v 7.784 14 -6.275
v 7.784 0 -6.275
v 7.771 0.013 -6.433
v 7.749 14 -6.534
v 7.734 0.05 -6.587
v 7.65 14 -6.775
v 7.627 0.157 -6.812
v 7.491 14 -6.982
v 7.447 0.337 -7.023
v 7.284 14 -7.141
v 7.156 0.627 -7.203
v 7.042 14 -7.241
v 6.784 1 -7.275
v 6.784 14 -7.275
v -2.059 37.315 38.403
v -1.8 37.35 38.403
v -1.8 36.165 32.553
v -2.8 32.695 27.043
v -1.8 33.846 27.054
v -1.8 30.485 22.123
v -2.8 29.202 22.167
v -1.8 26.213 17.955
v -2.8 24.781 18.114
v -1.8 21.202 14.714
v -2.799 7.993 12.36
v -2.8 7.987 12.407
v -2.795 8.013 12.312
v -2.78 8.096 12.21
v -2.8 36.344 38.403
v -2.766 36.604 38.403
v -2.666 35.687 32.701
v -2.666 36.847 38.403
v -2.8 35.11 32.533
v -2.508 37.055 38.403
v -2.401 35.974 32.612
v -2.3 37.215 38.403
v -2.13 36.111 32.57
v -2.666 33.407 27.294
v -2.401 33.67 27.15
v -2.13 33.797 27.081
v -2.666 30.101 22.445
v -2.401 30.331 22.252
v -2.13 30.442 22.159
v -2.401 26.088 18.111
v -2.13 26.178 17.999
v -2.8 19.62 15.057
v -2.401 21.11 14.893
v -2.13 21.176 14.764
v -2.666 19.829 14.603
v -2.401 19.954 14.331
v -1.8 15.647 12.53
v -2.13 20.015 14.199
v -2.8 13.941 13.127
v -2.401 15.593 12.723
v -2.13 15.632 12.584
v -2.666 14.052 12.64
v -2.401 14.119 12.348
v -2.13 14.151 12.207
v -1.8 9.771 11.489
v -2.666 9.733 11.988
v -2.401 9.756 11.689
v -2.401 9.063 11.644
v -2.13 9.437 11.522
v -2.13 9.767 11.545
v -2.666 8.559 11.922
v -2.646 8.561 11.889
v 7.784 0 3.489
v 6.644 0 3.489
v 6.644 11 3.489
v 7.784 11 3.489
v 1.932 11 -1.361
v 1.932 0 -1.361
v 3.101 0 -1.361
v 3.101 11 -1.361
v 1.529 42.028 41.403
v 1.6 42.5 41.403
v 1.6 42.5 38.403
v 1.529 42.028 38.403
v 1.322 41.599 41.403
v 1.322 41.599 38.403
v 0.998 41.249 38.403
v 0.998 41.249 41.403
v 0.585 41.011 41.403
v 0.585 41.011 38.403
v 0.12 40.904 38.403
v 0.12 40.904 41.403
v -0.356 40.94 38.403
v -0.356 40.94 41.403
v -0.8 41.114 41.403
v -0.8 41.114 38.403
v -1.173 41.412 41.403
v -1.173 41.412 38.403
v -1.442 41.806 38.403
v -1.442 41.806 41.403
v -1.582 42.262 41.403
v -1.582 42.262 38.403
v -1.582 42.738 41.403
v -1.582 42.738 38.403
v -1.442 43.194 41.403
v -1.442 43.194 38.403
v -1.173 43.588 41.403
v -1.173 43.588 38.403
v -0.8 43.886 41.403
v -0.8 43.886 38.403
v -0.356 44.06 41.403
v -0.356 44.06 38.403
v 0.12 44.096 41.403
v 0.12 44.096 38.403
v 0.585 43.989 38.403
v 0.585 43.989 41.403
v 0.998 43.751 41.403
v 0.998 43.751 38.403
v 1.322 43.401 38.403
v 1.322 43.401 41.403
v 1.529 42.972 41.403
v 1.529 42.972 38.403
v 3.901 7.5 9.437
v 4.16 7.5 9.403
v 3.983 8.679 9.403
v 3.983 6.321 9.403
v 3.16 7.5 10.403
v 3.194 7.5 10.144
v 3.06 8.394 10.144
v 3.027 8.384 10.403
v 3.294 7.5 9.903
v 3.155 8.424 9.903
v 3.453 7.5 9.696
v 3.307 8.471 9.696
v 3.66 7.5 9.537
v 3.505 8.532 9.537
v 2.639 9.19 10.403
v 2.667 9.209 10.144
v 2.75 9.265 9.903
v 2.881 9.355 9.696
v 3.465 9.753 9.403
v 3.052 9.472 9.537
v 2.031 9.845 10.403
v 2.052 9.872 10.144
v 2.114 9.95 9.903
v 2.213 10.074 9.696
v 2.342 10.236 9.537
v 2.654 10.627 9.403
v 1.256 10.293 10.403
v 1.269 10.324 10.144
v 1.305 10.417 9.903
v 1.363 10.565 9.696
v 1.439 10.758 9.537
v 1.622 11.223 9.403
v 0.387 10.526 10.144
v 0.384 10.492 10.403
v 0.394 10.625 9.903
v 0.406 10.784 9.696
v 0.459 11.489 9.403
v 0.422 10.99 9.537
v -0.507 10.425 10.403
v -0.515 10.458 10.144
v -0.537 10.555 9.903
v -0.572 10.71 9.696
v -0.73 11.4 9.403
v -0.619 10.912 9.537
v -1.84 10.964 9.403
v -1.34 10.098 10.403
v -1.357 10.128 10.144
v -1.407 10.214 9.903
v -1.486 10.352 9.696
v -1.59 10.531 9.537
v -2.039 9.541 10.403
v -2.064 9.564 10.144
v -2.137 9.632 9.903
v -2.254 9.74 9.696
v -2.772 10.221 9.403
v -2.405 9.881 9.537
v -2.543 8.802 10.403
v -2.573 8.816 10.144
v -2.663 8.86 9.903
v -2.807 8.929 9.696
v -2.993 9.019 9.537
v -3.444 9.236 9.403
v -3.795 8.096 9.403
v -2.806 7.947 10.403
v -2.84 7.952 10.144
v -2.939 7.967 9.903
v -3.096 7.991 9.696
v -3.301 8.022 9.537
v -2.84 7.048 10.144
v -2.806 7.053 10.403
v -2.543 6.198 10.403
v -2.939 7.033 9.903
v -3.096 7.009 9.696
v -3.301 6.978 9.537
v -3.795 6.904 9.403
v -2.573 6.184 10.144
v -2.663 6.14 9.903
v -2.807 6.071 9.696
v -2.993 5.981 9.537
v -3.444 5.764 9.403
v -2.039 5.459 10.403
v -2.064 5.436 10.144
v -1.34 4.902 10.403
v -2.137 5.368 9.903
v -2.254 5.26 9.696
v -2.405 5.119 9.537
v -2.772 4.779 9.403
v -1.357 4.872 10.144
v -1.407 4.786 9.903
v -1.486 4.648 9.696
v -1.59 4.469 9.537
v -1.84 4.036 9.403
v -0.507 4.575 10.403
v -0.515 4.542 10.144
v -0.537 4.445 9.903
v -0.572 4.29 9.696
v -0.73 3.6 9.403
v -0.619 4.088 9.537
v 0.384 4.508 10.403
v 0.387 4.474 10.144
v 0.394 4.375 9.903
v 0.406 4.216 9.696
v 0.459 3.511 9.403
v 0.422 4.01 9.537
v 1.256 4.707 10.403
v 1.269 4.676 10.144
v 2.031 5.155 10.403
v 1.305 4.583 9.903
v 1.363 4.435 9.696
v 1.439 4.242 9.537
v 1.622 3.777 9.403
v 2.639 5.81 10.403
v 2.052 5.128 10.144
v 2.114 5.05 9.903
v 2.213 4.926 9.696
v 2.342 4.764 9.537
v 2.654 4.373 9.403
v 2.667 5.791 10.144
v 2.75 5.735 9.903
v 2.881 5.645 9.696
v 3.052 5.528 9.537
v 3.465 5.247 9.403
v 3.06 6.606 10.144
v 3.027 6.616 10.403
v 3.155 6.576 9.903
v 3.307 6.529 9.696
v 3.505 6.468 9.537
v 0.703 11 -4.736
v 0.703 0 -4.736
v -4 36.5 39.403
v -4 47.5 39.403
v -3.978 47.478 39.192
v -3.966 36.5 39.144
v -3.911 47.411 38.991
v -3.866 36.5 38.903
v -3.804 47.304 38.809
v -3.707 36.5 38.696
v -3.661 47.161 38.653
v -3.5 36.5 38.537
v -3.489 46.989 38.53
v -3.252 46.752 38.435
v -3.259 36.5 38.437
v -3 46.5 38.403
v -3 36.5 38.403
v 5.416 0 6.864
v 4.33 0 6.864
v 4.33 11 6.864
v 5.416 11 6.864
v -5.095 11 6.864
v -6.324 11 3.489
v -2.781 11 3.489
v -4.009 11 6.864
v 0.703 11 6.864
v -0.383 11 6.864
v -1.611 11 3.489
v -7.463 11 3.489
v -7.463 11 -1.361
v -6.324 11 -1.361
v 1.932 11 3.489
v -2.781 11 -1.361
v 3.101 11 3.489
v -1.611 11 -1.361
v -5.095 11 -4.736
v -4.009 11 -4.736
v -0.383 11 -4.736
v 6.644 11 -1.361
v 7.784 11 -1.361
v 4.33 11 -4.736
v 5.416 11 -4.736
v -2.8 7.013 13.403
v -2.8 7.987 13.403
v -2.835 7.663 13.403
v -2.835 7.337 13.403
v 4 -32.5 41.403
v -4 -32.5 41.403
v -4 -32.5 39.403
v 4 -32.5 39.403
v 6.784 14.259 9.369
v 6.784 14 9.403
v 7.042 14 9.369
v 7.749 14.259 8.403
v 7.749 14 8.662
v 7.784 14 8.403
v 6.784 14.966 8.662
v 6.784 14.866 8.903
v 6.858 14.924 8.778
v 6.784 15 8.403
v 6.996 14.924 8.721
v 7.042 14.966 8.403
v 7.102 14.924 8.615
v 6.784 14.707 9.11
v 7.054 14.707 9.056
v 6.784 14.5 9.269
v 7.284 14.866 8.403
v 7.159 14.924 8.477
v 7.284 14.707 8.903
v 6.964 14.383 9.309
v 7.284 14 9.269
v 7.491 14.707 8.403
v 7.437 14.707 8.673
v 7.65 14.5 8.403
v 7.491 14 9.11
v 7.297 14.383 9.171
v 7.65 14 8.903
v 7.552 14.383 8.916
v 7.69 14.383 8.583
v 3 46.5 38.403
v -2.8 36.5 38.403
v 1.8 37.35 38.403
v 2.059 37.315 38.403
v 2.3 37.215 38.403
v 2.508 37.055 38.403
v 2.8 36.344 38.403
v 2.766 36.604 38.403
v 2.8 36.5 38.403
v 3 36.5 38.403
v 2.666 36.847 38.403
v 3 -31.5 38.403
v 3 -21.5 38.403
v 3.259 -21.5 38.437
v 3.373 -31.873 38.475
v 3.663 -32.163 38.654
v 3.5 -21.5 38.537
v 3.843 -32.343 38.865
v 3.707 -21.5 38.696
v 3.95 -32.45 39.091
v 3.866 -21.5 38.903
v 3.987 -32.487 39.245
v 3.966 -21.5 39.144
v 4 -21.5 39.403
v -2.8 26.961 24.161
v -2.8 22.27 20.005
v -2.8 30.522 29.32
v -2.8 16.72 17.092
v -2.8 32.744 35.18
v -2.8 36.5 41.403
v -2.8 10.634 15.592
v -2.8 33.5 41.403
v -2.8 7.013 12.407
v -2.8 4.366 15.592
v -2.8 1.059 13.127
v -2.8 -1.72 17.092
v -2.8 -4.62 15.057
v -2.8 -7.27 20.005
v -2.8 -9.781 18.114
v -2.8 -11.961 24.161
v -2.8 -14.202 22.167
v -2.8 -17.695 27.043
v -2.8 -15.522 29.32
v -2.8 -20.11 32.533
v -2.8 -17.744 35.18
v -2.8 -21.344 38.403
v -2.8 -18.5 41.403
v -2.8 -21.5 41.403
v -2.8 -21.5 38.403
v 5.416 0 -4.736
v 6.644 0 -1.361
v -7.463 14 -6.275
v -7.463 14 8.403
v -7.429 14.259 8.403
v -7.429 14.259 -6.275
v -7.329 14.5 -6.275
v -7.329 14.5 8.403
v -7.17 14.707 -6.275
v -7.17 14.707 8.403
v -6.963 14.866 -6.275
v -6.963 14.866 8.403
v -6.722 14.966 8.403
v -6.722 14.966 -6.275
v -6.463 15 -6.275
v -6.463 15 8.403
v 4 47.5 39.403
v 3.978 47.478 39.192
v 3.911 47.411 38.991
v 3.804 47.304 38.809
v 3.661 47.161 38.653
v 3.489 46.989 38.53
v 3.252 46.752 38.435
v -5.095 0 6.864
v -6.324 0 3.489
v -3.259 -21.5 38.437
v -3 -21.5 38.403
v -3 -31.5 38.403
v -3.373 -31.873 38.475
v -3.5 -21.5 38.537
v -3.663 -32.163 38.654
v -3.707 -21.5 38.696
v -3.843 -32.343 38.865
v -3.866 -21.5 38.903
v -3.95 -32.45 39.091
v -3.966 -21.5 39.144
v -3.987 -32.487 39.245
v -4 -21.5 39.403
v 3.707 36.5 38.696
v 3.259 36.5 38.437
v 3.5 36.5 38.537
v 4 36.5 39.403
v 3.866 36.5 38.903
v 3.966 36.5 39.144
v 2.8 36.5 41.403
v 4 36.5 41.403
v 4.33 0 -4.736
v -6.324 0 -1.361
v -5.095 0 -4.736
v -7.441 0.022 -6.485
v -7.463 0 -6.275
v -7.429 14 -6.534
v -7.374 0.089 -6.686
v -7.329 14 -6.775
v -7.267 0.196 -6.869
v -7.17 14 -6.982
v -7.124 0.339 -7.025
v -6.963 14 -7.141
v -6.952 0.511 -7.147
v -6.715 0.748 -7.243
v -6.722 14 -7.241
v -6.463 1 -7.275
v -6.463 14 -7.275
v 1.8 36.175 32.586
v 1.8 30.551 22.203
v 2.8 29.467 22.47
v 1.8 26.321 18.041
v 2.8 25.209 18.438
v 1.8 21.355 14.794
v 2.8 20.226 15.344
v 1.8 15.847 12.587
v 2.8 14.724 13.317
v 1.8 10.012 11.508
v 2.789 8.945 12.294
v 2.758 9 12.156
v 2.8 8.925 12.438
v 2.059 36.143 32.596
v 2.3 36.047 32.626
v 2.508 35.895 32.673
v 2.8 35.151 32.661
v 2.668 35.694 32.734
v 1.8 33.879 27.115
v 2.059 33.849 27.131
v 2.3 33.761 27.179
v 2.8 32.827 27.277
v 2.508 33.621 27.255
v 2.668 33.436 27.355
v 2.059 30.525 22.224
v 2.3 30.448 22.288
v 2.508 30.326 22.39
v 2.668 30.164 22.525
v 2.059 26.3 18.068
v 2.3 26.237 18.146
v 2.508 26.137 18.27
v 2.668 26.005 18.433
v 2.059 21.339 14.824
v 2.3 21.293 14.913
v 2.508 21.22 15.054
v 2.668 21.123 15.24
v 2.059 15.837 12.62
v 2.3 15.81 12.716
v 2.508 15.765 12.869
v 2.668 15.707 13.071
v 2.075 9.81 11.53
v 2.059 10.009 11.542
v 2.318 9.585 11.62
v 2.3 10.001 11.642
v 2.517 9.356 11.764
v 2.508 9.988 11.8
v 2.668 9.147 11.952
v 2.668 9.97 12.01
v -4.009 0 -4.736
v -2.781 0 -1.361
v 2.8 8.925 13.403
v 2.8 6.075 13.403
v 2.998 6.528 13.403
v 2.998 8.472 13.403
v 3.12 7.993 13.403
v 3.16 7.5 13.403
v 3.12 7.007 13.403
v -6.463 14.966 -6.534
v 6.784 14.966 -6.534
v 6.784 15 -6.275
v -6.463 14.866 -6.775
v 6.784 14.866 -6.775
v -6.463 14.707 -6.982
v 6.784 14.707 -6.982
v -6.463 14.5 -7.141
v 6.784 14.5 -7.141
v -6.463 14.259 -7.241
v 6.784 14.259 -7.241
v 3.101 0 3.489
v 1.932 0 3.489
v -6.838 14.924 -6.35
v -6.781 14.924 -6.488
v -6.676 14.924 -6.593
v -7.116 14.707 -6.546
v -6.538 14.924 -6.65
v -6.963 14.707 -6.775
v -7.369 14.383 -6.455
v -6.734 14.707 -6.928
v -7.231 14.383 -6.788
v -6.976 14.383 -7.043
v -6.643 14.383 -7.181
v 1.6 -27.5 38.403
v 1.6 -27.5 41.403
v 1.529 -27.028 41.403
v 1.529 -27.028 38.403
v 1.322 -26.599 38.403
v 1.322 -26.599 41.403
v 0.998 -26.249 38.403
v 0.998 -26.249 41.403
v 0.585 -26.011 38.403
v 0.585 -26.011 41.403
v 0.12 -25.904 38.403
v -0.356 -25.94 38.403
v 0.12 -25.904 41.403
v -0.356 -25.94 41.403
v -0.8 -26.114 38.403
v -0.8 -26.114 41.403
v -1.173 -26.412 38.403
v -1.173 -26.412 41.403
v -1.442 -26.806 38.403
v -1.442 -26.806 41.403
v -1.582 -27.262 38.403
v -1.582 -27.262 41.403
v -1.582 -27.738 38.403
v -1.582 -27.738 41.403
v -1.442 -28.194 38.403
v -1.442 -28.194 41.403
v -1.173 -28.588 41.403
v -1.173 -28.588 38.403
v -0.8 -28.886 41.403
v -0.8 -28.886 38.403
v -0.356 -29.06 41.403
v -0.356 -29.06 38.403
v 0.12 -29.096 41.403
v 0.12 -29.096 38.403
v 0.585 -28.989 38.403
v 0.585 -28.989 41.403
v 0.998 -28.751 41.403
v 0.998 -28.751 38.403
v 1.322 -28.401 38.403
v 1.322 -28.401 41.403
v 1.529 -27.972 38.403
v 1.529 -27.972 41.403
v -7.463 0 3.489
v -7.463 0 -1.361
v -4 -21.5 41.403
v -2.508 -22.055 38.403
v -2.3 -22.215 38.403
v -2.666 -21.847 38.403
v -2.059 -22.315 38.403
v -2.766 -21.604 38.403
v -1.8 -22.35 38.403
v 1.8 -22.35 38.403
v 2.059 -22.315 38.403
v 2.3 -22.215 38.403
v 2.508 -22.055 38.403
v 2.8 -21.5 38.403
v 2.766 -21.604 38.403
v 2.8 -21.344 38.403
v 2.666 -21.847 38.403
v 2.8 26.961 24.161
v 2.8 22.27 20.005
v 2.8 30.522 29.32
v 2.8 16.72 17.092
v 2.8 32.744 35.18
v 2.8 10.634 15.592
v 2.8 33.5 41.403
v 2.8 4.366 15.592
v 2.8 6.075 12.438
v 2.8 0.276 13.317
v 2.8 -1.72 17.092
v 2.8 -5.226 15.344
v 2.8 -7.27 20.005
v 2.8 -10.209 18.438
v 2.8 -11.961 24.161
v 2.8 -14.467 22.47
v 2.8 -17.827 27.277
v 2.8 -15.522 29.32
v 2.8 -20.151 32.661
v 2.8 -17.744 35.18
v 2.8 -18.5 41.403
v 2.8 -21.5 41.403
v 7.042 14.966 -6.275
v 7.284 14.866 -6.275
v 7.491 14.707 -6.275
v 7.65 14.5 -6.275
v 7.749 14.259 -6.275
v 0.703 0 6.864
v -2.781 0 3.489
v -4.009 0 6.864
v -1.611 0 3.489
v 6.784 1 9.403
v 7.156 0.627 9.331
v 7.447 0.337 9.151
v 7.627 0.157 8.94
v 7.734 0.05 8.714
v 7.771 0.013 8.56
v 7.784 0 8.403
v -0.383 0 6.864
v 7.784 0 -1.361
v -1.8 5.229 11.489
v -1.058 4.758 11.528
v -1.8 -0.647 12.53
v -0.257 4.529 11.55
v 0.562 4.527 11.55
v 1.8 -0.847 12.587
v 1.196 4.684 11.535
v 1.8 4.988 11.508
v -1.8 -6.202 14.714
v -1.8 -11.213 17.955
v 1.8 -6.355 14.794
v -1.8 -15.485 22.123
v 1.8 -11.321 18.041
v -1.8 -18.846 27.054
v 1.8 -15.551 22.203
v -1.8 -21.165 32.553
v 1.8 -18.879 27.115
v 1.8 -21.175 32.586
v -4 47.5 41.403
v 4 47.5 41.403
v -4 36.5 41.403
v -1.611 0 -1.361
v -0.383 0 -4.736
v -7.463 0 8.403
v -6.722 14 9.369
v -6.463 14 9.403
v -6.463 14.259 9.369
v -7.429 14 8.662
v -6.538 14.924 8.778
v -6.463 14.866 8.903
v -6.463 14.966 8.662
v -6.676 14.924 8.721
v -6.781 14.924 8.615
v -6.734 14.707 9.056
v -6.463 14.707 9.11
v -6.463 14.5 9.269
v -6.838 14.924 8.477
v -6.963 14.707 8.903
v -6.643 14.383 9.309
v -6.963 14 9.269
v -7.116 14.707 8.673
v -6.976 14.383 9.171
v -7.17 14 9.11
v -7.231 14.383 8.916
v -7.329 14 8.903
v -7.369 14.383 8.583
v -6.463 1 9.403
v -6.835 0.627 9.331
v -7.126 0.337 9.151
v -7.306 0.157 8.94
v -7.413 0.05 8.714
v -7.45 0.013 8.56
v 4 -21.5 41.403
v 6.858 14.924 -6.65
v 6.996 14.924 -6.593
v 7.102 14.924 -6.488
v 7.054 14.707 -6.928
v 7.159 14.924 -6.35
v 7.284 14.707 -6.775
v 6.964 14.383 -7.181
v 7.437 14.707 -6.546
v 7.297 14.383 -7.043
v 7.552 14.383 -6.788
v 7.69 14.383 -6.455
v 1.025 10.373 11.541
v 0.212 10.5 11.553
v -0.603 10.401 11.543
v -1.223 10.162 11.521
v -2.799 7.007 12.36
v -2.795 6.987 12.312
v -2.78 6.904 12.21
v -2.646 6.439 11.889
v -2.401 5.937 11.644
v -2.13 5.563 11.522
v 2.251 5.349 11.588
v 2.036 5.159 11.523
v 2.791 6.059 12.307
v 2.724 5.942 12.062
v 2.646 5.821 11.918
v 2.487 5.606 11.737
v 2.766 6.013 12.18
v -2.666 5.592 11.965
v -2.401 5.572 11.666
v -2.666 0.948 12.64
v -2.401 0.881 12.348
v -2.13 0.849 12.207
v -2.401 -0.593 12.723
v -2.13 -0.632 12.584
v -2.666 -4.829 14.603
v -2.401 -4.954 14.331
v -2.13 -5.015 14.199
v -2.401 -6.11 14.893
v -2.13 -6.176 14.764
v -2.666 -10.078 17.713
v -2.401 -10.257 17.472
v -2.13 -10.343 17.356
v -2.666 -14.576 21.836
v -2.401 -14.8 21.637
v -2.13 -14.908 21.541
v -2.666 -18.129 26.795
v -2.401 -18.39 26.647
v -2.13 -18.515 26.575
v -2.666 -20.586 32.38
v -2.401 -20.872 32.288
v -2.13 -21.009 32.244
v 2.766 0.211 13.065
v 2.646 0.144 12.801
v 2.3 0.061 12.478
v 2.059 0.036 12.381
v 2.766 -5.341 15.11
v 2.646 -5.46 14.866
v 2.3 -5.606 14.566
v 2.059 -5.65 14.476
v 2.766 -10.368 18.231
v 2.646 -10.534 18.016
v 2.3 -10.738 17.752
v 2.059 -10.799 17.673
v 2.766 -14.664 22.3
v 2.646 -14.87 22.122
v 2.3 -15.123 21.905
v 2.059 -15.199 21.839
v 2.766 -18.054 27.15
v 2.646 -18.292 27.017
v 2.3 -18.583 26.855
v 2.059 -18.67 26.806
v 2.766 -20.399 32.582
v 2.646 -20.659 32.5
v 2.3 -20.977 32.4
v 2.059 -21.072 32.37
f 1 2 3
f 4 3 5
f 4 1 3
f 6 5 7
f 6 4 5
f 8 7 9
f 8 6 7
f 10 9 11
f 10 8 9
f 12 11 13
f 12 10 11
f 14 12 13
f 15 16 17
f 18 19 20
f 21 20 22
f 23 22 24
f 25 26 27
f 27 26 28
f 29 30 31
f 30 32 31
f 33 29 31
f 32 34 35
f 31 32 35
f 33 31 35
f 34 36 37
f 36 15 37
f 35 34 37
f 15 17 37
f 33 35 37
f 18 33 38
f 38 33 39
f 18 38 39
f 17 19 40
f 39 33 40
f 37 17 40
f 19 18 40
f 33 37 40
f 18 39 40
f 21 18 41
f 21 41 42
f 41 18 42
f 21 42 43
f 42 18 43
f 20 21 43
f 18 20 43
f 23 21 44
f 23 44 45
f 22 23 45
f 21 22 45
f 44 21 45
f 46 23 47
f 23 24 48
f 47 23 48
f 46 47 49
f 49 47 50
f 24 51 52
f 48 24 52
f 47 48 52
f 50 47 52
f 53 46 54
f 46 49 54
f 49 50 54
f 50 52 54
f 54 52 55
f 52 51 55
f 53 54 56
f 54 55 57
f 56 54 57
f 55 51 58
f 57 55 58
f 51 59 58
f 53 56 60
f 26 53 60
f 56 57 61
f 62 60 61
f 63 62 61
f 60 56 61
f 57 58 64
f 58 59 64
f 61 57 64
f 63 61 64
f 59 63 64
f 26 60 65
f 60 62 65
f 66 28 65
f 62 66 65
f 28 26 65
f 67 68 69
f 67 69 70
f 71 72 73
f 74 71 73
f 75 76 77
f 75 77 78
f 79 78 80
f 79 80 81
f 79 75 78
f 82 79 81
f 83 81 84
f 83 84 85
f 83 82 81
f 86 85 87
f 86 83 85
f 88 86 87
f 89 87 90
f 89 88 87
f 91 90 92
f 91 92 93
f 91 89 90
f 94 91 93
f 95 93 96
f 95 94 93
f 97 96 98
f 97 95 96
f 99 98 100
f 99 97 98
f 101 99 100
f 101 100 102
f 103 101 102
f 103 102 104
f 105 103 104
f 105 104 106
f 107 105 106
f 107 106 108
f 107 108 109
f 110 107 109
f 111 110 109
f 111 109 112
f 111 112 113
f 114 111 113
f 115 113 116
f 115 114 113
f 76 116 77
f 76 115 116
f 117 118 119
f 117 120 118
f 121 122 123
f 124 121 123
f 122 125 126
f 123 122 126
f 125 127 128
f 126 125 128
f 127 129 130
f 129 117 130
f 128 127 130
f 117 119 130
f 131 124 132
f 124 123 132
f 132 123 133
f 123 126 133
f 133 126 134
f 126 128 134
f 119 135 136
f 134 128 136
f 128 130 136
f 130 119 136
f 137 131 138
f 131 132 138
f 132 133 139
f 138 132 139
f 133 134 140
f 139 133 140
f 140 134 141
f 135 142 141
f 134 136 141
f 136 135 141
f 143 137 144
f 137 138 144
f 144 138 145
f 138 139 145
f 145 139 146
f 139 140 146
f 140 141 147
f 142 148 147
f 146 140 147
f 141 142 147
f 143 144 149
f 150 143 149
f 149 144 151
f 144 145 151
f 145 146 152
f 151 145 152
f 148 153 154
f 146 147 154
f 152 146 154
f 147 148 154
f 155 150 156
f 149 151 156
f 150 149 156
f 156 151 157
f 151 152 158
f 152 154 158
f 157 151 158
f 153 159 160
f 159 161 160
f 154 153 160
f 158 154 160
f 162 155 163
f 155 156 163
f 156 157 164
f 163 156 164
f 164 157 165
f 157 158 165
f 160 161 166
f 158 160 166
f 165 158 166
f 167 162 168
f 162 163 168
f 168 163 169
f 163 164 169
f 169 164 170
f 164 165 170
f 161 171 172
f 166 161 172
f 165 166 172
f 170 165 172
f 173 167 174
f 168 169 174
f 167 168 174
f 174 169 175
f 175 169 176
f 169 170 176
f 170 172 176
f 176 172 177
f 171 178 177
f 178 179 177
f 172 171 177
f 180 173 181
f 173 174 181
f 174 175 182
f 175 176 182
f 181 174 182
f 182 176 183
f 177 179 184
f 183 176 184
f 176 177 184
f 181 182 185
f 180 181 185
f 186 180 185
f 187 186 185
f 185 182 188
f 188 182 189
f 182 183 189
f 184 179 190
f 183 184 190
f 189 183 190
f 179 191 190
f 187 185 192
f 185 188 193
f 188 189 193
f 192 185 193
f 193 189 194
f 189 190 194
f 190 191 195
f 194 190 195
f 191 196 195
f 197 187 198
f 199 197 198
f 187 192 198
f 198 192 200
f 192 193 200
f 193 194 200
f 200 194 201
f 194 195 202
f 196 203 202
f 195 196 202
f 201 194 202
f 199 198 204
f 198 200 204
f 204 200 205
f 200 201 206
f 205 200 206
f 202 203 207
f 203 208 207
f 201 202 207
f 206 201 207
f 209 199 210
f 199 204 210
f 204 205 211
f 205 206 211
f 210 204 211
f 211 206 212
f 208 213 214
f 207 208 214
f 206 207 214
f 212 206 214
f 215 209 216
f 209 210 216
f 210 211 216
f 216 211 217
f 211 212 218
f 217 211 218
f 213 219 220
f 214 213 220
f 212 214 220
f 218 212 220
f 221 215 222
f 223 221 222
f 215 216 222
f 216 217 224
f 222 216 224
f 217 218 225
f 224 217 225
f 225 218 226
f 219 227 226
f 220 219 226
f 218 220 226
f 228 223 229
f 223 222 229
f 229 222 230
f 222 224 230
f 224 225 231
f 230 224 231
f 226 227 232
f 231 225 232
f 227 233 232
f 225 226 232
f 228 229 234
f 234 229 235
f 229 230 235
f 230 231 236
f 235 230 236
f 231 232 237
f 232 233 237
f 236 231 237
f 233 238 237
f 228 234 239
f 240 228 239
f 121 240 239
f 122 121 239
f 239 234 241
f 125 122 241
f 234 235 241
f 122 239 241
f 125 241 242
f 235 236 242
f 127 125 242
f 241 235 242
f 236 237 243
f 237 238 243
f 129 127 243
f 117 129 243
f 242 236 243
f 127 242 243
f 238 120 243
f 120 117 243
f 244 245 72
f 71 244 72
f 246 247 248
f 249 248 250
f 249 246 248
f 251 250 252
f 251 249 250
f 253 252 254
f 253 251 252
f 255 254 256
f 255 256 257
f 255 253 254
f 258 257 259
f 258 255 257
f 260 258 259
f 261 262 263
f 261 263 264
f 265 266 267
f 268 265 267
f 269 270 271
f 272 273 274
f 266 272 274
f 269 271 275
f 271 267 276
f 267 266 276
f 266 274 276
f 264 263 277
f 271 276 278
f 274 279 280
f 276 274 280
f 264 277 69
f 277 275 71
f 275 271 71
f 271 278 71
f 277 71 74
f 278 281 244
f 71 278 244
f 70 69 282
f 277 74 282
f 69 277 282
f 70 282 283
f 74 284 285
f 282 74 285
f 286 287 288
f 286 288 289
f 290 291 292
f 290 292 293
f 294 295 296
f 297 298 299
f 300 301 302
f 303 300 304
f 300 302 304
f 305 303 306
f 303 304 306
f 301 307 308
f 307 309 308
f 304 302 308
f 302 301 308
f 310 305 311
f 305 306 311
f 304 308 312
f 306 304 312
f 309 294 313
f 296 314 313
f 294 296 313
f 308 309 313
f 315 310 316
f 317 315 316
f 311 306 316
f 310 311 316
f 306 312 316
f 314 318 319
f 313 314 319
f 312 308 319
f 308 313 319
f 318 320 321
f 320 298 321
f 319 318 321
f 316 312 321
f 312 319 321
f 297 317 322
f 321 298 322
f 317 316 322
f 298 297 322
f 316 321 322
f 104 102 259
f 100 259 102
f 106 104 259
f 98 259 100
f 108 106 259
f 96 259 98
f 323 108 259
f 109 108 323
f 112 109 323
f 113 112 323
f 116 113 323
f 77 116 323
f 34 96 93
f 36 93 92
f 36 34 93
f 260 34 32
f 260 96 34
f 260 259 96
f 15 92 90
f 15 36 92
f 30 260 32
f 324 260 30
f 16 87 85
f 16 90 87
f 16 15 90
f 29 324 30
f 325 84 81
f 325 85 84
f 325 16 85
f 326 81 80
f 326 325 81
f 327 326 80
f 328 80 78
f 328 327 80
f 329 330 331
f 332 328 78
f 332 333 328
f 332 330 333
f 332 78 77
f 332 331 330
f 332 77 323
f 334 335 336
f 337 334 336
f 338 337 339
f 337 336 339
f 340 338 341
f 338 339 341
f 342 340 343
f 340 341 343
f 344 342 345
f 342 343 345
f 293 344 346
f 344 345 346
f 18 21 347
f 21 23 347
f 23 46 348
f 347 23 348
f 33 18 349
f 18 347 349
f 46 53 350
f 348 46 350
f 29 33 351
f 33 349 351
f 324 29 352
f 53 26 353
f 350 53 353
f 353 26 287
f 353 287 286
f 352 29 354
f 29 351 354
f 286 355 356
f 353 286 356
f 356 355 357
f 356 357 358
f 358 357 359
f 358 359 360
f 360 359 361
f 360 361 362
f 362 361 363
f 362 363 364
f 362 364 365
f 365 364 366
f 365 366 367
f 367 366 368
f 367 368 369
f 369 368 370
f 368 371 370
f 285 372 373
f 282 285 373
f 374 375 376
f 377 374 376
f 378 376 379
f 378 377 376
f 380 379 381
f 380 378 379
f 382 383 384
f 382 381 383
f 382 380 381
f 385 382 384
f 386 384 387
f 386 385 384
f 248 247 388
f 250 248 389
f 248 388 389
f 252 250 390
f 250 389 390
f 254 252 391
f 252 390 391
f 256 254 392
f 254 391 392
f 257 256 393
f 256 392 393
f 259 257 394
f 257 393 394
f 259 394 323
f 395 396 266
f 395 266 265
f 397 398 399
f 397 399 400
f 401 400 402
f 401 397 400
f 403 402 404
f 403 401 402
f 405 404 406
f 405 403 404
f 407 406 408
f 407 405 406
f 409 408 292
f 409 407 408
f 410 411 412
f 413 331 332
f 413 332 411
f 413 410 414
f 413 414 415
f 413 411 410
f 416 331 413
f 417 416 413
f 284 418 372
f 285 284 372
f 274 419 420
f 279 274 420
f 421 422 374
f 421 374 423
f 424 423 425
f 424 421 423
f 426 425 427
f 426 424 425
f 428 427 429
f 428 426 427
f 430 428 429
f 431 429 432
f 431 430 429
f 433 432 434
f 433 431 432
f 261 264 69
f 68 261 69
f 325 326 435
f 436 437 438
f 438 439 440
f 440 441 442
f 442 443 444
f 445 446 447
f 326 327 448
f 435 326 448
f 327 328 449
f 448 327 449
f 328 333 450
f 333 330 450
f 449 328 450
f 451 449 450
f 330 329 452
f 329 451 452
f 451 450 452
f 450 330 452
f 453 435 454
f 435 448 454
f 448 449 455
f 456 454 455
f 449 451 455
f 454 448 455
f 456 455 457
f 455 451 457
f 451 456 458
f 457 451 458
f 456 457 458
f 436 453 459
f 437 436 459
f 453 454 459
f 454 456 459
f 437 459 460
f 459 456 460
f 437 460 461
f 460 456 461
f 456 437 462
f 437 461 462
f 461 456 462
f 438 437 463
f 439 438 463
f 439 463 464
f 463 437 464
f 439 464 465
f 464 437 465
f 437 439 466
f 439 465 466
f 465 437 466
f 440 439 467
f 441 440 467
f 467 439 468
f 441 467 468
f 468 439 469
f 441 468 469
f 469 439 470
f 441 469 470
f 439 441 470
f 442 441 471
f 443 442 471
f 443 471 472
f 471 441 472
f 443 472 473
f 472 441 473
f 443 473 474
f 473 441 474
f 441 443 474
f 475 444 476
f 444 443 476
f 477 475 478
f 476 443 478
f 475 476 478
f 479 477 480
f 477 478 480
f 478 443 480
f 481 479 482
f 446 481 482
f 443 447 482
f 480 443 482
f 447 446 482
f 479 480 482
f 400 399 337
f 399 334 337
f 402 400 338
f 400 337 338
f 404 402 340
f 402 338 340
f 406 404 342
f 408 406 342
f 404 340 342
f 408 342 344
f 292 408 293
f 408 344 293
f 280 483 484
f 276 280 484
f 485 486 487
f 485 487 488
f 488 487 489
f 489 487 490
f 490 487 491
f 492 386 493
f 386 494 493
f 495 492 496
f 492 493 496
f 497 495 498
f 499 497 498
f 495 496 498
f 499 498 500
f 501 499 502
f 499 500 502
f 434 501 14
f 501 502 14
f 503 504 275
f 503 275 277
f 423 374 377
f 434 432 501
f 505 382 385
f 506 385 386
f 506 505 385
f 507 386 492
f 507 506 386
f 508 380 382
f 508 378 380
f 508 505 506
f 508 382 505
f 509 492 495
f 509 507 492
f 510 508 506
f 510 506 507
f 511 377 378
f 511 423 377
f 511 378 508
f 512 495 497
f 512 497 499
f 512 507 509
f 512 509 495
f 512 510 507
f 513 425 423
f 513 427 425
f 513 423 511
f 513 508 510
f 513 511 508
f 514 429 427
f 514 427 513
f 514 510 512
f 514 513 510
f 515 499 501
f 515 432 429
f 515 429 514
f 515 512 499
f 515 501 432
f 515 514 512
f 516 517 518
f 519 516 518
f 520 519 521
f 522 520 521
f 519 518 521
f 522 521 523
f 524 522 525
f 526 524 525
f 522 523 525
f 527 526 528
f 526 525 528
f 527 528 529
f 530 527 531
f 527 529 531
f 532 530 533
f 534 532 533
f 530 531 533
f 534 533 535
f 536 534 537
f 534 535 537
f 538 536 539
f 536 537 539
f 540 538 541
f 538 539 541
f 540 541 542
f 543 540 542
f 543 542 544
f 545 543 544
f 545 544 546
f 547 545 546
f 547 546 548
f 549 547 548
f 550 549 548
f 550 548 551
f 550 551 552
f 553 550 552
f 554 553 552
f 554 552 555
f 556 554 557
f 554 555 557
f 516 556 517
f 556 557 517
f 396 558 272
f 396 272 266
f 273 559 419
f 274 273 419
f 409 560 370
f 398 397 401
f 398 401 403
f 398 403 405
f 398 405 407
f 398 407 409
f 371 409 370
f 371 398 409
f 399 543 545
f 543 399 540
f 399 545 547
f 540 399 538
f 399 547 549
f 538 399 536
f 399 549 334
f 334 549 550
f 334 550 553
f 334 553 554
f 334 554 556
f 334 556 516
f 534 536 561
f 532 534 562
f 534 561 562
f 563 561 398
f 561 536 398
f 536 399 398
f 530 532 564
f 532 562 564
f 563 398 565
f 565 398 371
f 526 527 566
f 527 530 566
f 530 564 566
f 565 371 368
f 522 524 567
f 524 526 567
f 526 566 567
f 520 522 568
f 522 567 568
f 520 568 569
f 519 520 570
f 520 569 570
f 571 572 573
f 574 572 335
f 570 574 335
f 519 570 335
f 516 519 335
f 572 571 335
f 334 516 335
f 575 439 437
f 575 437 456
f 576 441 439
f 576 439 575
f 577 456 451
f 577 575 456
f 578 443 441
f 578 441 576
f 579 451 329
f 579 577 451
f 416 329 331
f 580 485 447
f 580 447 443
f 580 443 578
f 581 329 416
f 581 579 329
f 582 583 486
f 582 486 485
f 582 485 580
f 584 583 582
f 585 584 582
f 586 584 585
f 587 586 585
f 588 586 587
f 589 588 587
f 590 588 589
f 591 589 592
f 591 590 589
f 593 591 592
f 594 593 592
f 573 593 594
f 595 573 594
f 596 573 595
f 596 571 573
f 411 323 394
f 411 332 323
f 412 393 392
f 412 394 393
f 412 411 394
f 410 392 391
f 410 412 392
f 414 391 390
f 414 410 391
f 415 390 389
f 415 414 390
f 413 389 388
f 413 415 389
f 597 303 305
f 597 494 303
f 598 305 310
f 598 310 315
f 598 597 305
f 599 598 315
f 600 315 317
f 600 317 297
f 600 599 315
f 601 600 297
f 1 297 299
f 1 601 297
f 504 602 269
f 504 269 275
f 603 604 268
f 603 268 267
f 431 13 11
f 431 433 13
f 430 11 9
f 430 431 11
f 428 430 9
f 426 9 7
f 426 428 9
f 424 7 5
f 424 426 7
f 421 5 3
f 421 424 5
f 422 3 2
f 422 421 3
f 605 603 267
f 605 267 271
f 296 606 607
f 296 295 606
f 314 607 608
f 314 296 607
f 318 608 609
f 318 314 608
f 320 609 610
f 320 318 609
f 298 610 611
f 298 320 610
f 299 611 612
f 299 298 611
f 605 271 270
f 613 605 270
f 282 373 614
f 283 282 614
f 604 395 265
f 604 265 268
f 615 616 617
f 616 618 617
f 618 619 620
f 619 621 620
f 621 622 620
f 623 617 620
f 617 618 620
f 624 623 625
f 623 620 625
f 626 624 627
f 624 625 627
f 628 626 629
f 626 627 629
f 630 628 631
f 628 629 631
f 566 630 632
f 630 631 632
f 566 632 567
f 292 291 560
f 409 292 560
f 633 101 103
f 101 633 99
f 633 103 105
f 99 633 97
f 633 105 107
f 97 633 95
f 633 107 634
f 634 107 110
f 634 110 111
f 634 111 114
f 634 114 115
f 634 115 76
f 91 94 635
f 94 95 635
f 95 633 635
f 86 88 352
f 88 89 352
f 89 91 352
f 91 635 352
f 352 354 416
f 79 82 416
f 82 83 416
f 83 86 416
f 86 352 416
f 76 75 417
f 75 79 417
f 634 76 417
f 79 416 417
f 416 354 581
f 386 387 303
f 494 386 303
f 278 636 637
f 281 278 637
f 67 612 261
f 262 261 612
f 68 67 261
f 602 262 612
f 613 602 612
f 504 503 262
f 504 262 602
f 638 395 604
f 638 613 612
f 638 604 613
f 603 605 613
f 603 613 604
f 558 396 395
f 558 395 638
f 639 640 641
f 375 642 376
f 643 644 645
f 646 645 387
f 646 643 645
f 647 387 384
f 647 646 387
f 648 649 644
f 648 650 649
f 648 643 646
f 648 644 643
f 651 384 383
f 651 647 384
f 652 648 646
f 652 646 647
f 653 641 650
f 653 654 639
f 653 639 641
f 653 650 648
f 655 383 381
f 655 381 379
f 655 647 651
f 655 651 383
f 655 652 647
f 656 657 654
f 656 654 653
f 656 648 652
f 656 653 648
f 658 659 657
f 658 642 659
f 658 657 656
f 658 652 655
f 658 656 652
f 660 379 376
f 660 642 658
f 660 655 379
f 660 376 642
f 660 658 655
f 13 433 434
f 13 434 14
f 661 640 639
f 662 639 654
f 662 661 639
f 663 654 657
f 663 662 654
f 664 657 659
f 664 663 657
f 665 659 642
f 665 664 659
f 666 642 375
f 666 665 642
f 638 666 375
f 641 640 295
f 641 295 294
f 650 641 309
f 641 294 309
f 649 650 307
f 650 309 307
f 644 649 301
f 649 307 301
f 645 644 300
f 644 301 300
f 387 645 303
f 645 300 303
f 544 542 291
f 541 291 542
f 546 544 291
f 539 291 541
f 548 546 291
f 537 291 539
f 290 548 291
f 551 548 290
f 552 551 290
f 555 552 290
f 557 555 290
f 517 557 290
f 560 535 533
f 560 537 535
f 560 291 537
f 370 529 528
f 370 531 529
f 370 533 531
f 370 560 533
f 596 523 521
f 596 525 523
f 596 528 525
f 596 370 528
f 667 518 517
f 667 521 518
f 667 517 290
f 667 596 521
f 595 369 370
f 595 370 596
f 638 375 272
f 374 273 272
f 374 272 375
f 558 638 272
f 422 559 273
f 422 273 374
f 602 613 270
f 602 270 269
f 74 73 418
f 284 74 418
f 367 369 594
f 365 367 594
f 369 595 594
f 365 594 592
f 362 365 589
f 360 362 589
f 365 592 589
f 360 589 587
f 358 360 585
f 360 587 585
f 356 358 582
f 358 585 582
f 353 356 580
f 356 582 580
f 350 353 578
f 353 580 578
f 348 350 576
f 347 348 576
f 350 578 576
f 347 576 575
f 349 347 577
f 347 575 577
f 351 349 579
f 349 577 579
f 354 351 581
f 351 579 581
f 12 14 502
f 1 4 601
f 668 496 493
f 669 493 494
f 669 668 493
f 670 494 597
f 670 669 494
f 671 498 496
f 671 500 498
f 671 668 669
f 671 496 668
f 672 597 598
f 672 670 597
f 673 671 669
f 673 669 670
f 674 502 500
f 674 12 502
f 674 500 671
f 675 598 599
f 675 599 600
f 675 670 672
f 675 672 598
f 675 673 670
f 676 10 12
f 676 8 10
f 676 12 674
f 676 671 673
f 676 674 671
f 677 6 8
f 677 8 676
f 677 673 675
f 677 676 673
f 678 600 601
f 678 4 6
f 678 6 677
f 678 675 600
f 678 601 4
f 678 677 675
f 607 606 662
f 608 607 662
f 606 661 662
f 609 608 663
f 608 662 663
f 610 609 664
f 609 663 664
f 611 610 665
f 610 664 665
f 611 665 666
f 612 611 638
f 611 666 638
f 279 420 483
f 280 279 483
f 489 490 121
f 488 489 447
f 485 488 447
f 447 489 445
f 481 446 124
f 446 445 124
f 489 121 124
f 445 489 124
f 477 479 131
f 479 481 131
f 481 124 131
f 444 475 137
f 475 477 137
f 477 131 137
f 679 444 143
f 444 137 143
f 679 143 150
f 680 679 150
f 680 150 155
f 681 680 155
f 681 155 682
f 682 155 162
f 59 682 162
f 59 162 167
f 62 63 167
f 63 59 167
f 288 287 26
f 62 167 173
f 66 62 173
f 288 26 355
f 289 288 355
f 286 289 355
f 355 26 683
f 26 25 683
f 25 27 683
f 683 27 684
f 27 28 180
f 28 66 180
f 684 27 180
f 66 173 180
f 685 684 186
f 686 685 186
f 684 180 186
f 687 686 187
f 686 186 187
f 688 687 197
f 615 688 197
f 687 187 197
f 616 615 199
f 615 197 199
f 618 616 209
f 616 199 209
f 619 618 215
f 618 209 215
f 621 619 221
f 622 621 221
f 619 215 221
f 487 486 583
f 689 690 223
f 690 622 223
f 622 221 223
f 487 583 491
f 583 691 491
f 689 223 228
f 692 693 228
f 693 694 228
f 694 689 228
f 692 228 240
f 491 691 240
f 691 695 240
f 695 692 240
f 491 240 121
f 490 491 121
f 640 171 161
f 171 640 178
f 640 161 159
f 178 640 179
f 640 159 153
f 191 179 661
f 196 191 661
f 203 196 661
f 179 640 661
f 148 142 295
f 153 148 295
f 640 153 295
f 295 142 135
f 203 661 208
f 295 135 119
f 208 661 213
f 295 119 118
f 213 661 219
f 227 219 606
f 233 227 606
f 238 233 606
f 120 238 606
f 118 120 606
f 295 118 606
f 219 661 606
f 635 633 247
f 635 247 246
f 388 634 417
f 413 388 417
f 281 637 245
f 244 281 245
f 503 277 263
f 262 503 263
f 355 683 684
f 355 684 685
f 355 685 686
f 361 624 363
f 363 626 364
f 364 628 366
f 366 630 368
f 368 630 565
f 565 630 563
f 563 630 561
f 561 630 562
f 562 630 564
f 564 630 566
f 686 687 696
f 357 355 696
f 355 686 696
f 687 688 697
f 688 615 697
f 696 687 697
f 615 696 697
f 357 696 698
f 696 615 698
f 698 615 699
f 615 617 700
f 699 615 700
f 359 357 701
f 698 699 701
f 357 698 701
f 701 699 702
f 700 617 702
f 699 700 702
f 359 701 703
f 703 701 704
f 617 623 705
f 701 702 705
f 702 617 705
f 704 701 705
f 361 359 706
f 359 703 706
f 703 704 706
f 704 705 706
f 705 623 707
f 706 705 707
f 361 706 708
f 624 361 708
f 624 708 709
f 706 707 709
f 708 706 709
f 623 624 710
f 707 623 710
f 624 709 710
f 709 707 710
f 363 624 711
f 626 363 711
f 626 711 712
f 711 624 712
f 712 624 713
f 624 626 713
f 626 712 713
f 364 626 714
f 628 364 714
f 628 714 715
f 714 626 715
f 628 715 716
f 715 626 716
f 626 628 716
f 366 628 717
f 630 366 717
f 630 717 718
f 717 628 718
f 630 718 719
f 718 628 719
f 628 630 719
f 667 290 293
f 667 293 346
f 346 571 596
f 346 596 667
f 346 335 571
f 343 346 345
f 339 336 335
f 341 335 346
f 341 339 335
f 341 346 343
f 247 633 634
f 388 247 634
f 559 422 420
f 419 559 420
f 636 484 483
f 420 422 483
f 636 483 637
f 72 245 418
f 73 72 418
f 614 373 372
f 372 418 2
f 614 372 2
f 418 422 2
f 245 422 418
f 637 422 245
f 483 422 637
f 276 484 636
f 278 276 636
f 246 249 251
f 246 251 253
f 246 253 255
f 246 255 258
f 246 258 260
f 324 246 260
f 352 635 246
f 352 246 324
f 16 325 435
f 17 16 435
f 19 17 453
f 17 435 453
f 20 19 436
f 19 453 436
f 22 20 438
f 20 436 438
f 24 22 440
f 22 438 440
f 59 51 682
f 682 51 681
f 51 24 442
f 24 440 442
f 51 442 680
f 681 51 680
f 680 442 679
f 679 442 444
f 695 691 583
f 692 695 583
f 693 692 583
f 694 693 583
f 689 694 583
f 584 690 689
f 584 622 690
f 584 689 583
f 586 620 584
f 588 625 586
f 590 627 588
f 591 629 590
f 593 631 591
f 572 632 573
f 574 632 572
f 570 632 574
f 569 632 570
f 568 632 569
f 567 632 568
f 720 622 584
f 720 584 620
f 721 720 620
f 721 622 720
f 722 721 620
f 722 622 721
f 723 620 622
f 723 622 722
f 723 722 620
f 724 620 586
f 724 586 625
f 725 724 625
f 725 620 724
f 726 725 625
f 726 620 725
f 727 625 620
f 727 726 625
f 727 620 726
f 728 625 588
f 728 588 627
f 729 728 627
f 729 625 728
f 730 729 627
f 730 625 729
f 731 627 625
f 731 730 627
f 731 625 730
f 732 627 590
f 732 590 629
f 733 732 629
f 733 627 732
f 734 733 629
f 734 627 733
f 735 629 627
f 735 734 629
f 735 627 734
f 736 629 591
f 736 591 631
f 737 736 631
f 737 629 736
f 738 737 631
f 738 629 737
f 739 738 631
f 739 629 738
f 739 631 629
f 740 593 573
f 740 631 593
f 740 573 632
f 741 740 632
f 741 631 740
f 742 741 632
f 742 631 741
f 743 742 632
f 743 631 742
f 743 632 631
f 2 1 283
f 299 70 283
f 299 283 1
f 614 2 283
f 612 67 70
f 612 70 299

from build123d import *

# Parameters (mm, degrees)
BOSS_EXTRUDE1_DEPTH   = 11
BOSS_EXTRUDE1_2_DEPTH = 11
SKETCH2_W             = 15.446473034
SKETCH2_H             = 16.677637278
BOSS_EXTRUDE2_DEPTH   = 4
SKETCH3_R             = 3
BOSS_EXTRUDE3_DEPTH   = 4
BOSS_EXTRUDE4_DEPTH   = 2.8
CUT_EXTRUDE1_DEPTH    = 11
SKETCH11_W            = 0.1
SKETCH11_H            = 16.677637278
CUT_EXTRUDE2_DEPTH    = 11
SKETCH12_W            = 8
SKETCH12_H            = 14
SKETCH12_R            = 1.6
BOSS_EXTRUDE5_DEPTH   = 3
FILLET1_R             = 1
SKETCH14_W            = 1.465452289
SKETCH14_H            = 3.319739537
SKETCH14_W_2          = 1.579669893
CUT_EXTRUDE3_DEPTH    = 3
SKETCH15_W            = 1.507141025
SKETCH15_H            = 3.716681852
SKETCH15_W_2          = 1.554838049
SKETCH15_H_2          = 3.443775751
CUT_EXTRUDE4_DEPTH    = 3


with BuildPart() as part:
    # Sketch1 → Boss-Extrude1 (new body)
    with BuildSketch(Plane(origin=(0, 0, 0), x_dir=(1, 0, 0), z_dir=(0, 1, 0))):
        Polygon((6.574205289, -3.388868816), (7.883511398, -3.388868816), (7.883511398, -9.402687455), (-7.562961636, -9.402687455), (-7.562961636, -3.388868816), (-6.253655527, -3.388868816), (-5.025255986, -6.763868816), (-4.078972201, -6.763868816), (-2.850572661, -3.388868816), (-1.541266552, -3.388868816), (-0.312867011, -6.763868816), (0.633416774, -6.763868816), (1.861816314, -3.388868816), (3.171122423, -3.388868816), (4.399521964, -6.763868816), (5.345805749, -6.763868816), align=None)
    extrude(amount=BOSS_EXTRUDE1_DEPTH)



with BuildPart() as body_2:
    # Sketch1 → Boss-Extrude1 2 (new body)
    with BuildSketch(Plane(origin=(0, 0, 0), x_dir=(1, 0, 0), z_dir=(0, 1, 0))):
        Polygon((6.574205289, 1.261131184), (7.883511398, 1.261131184), (7.883511398, 7.274949823), (-7.562961636, 7.274949823), (-7.562961636, 1.261131184), (-6.253655527, 1.261131184), (-5.025255986, 4.636131184), (-4.078972201, 4.636131184), (-2.850572661, 1.261131184), (-1.541266552, 1.261131184), (-0.312867011, 4.636131184), (0.633416774, 4.636131184), (1.861816314, 1.261131184), (3.171122423, 1.261131184), (4.399521964, 4.636131184), (5.345805749, 4.636131184), align=None)
    extrude(amount=BOSS_EXTRUDE1_2_DEPTH)


with BuildPart() as part_1:
    add(part.part)

    add(body_2.part)  # Boss-Extrude2 merges body 2
    # Sketch2 → Boss-Extrude2 (add)
    with BuildSketch(Plane(origin=(0, 11, 0), x_dir=(1, 0, 0), z_dir=(0, 1, 0))):
        with Locations((0.160274881, -1.063868816)):
            Rectangle(SKETCH2_W, SKETCH2_H)
    extrude(amount=BOSS_EXTRUDE2_DEPTH)

    # Sketch3 → Boss-Extrude3 (add)
    with BuildSketch(Plane.XY.offset(9.402687455)):
        with Locations((0.160274881, 7.5)):
            Circle(SKETCH3_R)
    extrude(amount=BOSS_EXTRUDE3_DEPTH)

    # Sketch7 → Boss-Extrude4 (add, symmetric)
    with BuildSketch(Plane(origin=(0, 0, 0), x_dir=(0, 0, -1), z_dir=(1, 0, 0))):
        with BuildLine():
            Line((-41.402687455, -22.5), (-41.402687455, -18.5))
            ThreePointArc((-41.402687455, -18.5), (-15.402687455, 7.5), (-41.402687455, 33.5))
            Line((-41.402687455, 33.5), (-41.402687455, 37.5))
            ThreePointArc((-41.402687455, 37.5), (-11.402687455, 7.5), (-41.402687455, -22.5))
        make_face()
    extrude(amount=BOSS_EXTRUDE4_DEPTH, both=True)

    # Sketch9 → Cut-Extrude1 (cut)
    with BuildSketch(Plane(origin=(0, 0, 0), x_dir=(-1, 0, 0), z_dir=(0, -1, 0))):
        Polygon((7.462961636, -9.402687455), (7.462961636, -3.488868816), (6.323676281, -3.488868816), (5.09527674, -6.863868816), (4.008951448, -6.863868816), (2.780551907, -3.488868816), (1.611287306, -3.488868816), (0.382887765, -6.863868816), (-0.703437527, -6.863868816), (-1.931837068, -3.488868816), (-3.101101669, -3.488868816), (-4.32950121, -6.863868816), (-5.415826502, -6.863868816), (-6.644226043, -3.488868816), (-7.783511398, -3.488868816), (-7.783511398, -9.402687455), (-7.883511398, -9.402687455), (-7.883511398, -3.388868816), (-6.574205289, -3.388868816), (-5.345805749, -6.763868816), (-4.399521964, -6.763868816), (-3.171122423, -3.388868816), (-1.861816314, -3.388868816), (-0.633416774, -6.763868816), (0.312867011, -6.763868816), (1.541266552, -3.388868816), (2.850572661, -3.388868816), (4.078972201, -6.763868816), (5.025255986, -6.763868816), (6.253655527, -3.388868816), (7.562961636, -3.388868816), (7.562961636, -9.402687455), align=None)
        Polygon((7.562961636, 1.261131184), (7.562961636, 7.274949823), (7.462961636, 7.274949823), (7.462961636, 1.361131184), (6.323676281, 1.361131184), (5.09527674, 4.736131184), (4.008951448, 4.736131184), (2.780551907, 1.361131184), (1.611287306, 1.361131184), (0.382887765, 4.736131184), (-0.703437527, 4.736131184), (-1.931837068, 1.361131184), (-3.101101669, 1.361131184), (-4.32950121, 4.736131184), (-5.415826502, 4.736131184), (-6.644226043, 1.361131184), (-7.783511398, 1.361131184), (-7.783511398, 7.274949823), (-7.883511398, 7.274949823), (-7.883511398, 1.261131184), (-6.574205289, 1.261131184), (-5.345805749, 4.636131184), (-4.399521964, 4.636131184), (-3.171122423, 1.261131184), (-1.861816314, 1.261131184), (-0.633416774, 4.636131184), (0.312867011, 4.636131184), (1.541266552, 1.261131184), (2.850572661, 1.261131184), (4.078972201, 4.636131184), (5.025255986, 4.636131184), (6.253655527, 1.261131184), align=None)
    extrude(amount=-CUT_EXTRUDE1_DEPTH, mode=Mode.SUBTRACT)

    # Sketch11 → Cut-Extrude2 (cut)
    with BuildSketch(Plane.XZ.offset(-11)):
        with Locations((7.833511398, 1.063868816)):
            Rectangle(SKETCH11_W, SKETCH11_H)
        with Locations((-7.512961636, 1.063868816)):
            Rectangle(SKETCH11_W, SKETCH11_H)
    extrude(amount=-CUT_EXTRUDE2_DEPTH, mode=Mode.SUBTRACT)

    # Sketch12 → Boss-Extrude5 (add)
    with BuildSketch(Plane.XY.offset(41.402687455)):
        with Locations((0, -25.5)):
            Rectangle(SKETCH12_W, SKETCH12_H)
        with Locations((0, -27.5)):
            Circle(SKETCH12_R, mode=Mode.SUBTRACT)
    boss_extrude5 = extrude(amount=-BOSS_EXTRUDE5_DEPTH)

    # Mirror1: Boss-Extrude5 across plane
    add(boss_extrude5.mirror(Plane.ZX.offset(7.5)))

    # Fillet1
    fillet1_edges = [part_1.edges().sort_by_distance(p)[0] for p in [
        (0.160274881, 0, 9.402687455),
        (-7.462961636, 7.5, 9.402687455),
        (7.783511398, 7.5, 9.402687455),
        (-2.839725119, 7.5, 9.402687455),
        (-7.462961636, 7.5, -7.274949823),
        (0.160274881, 0, -7.274949823),
        (7.783511398, 7.5, -7.274949823),
        (0.160274881, 15, 9.402687455),
        (-7.462961636, 15, 1.063868816),
        (0.160274881, 15, -7.274949823),
        (7.783511398, 15, 1.063868816),
        (0, -32.5, 38.402687455),
        (-4, -25.5, 38.402687455),
        (4, -25.5, 38.402687455),
        (0, 47.5, 38.402687455),
        (4, 40.5, 38.402687455),
        (-4, 40.5, 38.402687455),
        (-2.8, 27.804389345, 19.318037281),
        (2.8, 28.147641568, 19.638613901),
        (-2.8, -12.804389345, 19.318037281),
        (2.8, -13.147641568, 19.638613901),
    ]]
    fillet(fillet1_edges, radius=FILLET1_R)

    # Sketch14 → Cut-Extrude3 (cut)
    with BuildSketch(Plane.XZ.offset(-33.5)):
        with Locations((-3.532726145, 39.742817687)):
            Rectangle(SKETCH14_W, SKETCH14_H)
        with Locations((3.589834946, 39.742817687)):
            Rectangle(SKETCH14_W_2, SKETCH14_H)
    extrude(amount=-CUT_EXTRUDE3_DEPTH, mode=Mode.SUBTRACT)

    # Sketch15 → Cut-Extrude4 (cut)
    with BuildSketch(Plane(origin=(0, -18.5, 0), x_dir=(1, 0, 0), z_dir=(0, 1, 0))):
        with Locations((3.553570513, -39.544346529)):
            Rectangle(SKETCH15_W, SKETCH15_H)
        with Locations((-3.577419025, -39.68079958)):
            Rectangle(SKETCH15_W_2, SKETCH15_H_2)
    extrude(amount=-CUT_EXTRUDE4_DEPTH, mode=Mode.SUBTRACT)


solid = part_1.part
